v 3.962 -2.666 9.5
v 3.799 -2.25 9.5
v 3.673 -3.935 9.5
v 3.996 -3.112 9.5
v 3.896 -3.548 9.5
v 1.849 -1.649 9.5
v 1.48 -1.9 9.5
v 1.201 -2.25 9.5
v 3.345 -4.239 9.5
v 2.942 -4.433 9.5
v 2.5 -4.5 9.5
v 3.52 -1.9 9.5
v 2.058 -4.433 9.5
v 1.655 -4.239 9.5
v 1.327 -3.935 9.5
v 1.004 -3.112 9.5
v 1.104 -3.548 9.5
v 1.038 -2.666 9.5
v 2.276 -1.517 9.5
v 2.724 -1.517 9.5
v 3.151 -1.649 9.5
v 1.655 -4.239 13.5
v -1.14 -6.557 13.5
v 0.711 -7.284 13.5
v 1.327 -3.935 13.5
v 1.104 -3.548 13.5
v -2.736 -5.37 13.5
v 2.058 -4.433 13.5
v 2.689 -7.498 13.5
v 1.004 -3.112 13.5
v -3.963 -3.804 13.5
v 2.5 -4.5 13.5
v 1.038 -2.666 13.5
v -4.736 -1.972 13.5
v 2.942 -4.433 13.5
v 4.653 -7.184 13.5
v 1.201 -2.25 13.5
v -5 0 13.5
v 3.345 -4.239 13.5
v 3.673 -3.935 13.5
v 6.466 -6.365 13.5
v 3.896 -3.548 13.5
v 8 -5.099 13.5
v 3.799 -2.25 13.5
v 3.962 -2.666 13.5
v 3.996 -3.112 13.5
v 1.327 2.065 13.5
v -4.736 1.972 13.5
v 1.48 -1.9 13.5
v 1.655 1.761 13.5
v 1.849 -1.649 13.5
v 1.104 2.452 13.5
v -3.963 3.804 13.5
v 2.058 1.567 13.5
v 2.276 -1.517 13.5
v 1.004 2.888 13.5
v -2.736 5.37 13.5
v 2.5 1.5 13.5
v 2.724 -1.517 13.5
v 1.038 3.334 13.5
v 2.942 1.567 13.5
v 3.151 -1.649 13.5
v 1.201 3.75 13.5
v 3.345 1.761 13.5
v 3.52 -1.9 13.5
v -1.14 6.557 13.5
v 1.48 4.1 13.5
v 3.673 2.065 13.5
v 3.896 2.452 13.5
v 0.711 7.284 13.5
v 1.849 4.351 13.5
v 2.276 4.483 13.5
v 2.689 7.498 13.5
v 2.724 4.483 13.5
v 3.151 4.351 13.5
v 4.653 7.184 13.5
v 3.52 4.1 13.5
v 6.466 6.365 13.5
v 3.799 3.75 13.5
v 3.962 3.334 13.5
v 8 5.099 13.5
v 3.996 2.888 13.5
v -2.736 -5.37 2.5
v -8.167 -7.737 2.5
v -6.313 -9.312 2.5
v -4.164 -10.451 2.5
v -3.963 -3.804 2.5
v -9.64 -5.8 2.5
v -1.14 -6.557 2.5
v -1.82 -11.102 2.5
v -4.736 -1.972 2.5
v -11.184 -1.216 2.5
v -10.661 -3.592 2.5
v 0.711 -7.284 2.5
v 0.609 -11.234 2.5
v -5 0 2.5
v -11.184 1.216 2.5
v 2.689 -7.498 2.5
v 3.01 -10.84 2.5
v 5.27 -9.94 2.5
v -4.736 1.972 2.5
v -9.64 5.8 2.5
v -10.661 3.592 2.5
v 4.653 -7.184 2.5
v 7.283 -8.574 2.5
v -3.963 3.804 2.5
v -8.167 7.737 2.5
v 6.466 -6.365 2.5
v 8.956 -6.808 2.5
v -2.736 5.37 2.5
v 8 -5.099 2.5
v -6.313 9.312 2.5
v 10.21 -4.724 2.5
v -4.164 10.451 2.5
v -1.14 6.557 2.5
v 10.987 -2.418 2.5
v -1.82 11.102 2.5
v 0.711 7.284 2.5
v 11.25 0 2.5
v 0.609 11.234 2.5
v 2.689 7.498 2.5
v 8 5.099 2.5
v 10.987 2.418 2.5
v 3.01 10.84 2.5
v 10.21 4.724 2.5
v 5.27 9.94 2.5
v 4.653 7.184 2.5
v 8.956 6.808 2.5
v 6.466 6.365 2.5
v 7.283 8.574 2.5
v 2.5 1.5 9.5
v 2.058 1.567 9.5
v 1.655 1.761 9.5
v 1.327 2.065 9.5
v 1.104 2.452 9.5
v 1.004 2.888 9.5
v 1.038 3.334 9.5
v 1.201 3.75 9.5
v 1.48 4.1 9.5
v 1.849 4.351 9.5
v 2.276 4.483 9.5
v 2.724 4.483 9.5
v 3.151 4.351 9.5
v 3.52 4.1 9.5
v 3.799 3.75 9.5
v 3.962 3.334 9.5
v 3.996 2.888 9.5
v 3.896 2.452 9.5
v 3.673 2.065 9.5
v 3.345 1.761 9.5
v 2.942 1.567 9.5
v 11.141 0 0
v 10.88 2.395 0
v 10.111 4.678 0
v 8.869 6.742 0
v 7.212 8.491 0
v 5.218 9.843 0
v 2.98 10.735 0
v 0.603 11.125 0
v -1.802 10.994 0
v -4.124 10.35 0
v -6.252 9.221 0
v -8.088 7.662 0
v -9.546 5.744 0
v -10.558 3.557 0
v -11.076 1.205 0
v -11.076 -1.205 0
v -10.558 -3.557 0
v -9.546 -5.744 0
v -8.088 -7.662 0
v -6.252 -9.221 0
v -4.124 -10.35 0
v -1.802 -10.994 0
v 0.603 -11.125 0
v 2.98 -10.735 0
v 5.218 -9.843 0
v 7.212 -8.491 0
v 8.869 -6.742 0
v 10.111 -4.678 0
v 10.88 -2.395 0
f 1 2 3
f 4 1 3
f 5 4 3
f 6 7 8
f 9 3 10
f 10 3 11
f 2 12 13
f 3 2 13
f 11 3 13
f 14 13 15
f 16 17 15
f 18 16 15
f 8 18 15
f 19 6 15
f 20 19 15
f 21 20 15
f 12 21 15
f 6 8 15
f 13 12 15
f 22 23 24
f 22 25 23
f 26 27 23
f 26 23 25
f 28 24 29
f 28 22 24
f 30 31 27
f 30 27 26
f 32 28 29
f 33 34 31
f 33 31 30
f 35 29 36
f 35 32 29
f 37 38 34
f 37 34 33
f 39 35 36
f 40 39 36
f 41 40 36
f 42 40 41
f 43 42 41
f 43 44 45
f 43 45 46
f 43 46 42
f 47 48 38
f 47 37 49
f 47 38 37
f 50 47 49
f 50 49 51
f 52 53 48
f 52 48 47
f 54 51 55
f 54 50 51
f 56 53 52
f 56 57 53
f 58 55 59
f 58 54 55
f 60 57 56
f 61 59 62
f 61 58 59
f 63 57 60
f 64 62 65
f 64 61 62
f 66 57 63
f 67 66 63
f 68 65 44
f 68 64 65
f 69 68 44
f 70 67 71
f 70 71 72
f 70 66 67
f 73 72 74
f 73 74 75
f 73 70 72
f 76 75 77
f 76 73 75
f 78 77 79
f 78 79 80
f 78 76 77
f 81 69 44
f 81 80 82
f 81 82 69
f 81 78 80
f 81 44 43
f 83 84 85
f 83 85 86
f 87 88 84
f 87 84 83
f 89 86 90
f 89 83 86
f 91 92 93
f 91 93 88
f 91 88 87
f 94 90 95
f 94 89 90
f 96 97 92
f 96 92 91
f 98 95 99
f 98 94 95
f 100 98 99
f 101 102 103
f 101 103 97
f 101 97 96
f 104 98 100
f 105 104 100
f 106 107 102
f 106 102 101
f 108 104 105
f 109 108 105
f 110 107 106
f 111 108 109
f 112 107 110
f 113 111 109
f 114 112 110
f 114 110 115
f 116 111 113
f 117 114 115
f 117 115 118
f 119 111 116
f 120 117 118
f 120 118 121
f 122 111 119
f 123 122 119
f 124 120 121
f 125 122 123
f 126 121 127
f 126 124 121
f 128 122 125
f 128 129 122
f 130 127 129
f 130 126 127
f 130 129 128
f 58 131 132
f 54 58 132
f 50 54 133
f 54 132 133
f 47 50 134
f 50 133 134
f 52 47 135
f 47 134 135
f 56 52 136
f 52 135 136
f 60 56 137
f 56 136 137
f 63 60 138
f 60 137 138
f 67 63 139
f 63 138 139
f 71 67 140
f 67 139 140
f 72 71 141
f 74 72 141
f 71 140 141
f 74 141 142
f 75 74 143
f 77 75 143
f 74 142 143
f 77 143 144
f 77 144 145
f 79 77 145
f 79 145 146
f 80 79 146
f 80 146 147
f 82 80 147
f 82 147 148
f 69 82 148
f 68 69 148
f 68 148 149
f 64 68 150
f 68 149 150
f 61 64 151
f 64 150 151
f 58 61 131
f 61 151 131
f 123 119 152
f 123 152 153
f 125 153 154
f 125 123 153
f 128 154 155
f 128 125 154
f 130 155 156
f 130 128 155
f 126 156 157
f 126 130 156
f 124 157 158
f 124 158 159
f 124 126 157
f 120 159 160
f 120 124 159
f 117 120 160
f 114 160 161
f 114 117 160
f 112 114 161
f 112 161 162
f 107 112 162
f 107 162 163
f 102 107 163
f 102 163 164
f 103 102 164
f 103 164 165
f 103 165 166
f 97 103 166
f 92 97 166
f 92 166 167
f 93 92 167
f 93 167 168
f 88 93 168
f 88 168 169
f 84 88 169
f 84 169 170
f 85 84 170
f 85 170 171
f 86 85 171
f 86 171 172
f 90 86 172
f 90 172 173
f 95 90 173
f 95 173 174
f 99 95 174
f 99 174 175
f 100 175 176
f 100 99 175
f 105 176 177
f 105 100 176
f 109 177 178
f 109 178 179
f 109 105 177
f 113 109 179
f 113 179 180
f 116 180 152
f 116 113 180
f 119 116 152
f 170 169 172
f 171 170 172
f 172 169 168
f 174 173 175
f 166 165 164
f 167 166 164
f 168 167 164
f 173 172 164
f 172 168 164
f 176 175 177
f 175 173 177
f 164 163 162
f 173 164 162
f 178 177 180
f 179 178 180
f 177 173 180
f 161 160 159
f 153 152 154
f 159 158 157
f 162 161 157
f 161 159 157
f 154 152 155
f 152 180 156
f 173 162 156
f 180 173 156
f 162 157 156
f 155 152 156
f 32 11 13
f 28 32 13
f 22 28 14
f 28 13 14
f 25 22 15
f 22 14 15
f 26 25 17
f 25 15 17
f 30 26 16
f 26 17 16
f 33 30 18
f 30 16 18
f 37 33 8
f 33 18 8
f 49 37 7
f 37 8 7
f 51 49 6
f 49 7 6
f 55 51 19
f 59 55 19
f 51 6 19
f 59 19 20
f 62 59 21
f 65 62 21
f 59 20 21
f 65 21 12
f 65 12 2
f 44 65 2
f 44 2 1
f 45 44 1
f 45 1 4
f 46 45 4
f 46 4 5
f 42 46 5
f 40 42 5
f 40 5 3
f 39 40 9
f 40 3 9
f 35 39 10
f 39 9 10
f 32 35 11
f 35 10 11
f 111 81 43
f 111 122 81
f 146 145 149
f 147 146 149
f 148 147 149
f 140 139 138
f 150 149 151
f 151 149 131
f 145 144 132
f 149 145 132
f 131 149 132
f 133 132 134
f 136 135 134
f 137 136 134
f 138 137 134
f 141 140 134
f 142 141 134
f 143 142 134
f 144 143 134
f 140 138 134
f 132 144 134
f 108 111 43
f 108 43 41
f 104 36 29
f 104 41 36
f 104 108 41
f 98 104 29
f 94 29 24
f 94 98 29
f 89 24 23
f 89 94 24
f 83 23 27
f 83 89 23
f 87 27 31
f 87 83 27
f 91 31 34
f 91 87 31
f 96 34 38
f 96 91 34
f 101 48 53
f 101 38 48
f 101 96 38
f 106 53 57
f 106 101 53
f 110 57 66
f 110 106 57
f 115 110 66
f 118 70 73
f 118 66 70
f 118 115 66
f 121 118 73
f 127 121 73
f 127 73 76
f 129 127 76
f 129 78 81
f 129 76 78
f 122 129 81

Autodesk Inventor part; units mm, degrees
ref_plane "YZ Plane" through (0, 0, 0) normal (1, 0, 0) x (0, 1, 0)
ref_plane "XZ Plane" through (0, 0, 0) normal (0, 1, 0) x (-1, 0, 0)
sketch "Sketch1" plane through (0, 0, 0) normal (0, 0, 1) x (1, 0, 0)
  circle A0 centre (0, 0) radius 11.25
  line L0 (0, 0) -> (2.5, 0)
  circle A1 centre (2.5, 0) radius 7.5
  line L1 (8, 6.7455) -> (8, -7.7933)
  point P0 (10, 0)
  point P1 (10, 0)
  point P2 (8, -5.099)
  point P3 (8, 5.099)
  dimension "d2" = 15
  dimension "d0" = 22.5
  dimension "d1" = 2.5
  dimension "d3" = 2
extrude "Extrusion1" add sketch "Sketch1" along normal blind 2.5 contours A0 | A1 L1 | L1 A1
extrude "Extrusion2" add sketch "Sketch1" along normal blind 11 from surface at 2.5 contours L1 A1 picked at (-0.3888, 1.1518)
sketch "Sketch2" plane through (2.5, 0, 13.5) normal (0, 0, 1) x (1, 0, 0)
  line L0 (0, 0) -> (0, 3)
  circle A0 centre (0, 3) radius 2.75
  line L1 (-18.25, 0) -> (13.25, 0) construction
  circle A1 centre (0, -3) radius 2.75
  point P0 (-2.5, 0)
  dimension "d8" = 3
  dimension "d23" = 5.5
hole "Hole1" at (2.5, 3, 13.5) at (2.5, -3, 13.5) direction (0, 0, -1) diameter 3 depth 4
draft "FaceDraft1" angle 2.5 pull direction (0, 0, -1) faces at (11.1043, -1.8046, 1.6667) fixed edges at (-11.25, 0, 2.5)
sketch "Sketch3" plane through (0, 0, 20) normal (0, 0, 1) x (1, 0, 0)
  arc A0 (5.5, 4) -> (5.5, -4) centre (2.5, 0) ccw projected
  circle A1 centre (2.5, 2) radius 1.5 projected
  circle A2 centre (2.5, -1.8526) radius 1.5 projected
  line L0 (2.5, 5) -> (27.5, 5)
  line L1 (2.5, -5) -> (27.5, -5)
  line L2 (27.5, -5) -> (27.5, 5)
  point P0 (0, 0)
  dimension "d18" = 25
  dimension "d19" = 25
